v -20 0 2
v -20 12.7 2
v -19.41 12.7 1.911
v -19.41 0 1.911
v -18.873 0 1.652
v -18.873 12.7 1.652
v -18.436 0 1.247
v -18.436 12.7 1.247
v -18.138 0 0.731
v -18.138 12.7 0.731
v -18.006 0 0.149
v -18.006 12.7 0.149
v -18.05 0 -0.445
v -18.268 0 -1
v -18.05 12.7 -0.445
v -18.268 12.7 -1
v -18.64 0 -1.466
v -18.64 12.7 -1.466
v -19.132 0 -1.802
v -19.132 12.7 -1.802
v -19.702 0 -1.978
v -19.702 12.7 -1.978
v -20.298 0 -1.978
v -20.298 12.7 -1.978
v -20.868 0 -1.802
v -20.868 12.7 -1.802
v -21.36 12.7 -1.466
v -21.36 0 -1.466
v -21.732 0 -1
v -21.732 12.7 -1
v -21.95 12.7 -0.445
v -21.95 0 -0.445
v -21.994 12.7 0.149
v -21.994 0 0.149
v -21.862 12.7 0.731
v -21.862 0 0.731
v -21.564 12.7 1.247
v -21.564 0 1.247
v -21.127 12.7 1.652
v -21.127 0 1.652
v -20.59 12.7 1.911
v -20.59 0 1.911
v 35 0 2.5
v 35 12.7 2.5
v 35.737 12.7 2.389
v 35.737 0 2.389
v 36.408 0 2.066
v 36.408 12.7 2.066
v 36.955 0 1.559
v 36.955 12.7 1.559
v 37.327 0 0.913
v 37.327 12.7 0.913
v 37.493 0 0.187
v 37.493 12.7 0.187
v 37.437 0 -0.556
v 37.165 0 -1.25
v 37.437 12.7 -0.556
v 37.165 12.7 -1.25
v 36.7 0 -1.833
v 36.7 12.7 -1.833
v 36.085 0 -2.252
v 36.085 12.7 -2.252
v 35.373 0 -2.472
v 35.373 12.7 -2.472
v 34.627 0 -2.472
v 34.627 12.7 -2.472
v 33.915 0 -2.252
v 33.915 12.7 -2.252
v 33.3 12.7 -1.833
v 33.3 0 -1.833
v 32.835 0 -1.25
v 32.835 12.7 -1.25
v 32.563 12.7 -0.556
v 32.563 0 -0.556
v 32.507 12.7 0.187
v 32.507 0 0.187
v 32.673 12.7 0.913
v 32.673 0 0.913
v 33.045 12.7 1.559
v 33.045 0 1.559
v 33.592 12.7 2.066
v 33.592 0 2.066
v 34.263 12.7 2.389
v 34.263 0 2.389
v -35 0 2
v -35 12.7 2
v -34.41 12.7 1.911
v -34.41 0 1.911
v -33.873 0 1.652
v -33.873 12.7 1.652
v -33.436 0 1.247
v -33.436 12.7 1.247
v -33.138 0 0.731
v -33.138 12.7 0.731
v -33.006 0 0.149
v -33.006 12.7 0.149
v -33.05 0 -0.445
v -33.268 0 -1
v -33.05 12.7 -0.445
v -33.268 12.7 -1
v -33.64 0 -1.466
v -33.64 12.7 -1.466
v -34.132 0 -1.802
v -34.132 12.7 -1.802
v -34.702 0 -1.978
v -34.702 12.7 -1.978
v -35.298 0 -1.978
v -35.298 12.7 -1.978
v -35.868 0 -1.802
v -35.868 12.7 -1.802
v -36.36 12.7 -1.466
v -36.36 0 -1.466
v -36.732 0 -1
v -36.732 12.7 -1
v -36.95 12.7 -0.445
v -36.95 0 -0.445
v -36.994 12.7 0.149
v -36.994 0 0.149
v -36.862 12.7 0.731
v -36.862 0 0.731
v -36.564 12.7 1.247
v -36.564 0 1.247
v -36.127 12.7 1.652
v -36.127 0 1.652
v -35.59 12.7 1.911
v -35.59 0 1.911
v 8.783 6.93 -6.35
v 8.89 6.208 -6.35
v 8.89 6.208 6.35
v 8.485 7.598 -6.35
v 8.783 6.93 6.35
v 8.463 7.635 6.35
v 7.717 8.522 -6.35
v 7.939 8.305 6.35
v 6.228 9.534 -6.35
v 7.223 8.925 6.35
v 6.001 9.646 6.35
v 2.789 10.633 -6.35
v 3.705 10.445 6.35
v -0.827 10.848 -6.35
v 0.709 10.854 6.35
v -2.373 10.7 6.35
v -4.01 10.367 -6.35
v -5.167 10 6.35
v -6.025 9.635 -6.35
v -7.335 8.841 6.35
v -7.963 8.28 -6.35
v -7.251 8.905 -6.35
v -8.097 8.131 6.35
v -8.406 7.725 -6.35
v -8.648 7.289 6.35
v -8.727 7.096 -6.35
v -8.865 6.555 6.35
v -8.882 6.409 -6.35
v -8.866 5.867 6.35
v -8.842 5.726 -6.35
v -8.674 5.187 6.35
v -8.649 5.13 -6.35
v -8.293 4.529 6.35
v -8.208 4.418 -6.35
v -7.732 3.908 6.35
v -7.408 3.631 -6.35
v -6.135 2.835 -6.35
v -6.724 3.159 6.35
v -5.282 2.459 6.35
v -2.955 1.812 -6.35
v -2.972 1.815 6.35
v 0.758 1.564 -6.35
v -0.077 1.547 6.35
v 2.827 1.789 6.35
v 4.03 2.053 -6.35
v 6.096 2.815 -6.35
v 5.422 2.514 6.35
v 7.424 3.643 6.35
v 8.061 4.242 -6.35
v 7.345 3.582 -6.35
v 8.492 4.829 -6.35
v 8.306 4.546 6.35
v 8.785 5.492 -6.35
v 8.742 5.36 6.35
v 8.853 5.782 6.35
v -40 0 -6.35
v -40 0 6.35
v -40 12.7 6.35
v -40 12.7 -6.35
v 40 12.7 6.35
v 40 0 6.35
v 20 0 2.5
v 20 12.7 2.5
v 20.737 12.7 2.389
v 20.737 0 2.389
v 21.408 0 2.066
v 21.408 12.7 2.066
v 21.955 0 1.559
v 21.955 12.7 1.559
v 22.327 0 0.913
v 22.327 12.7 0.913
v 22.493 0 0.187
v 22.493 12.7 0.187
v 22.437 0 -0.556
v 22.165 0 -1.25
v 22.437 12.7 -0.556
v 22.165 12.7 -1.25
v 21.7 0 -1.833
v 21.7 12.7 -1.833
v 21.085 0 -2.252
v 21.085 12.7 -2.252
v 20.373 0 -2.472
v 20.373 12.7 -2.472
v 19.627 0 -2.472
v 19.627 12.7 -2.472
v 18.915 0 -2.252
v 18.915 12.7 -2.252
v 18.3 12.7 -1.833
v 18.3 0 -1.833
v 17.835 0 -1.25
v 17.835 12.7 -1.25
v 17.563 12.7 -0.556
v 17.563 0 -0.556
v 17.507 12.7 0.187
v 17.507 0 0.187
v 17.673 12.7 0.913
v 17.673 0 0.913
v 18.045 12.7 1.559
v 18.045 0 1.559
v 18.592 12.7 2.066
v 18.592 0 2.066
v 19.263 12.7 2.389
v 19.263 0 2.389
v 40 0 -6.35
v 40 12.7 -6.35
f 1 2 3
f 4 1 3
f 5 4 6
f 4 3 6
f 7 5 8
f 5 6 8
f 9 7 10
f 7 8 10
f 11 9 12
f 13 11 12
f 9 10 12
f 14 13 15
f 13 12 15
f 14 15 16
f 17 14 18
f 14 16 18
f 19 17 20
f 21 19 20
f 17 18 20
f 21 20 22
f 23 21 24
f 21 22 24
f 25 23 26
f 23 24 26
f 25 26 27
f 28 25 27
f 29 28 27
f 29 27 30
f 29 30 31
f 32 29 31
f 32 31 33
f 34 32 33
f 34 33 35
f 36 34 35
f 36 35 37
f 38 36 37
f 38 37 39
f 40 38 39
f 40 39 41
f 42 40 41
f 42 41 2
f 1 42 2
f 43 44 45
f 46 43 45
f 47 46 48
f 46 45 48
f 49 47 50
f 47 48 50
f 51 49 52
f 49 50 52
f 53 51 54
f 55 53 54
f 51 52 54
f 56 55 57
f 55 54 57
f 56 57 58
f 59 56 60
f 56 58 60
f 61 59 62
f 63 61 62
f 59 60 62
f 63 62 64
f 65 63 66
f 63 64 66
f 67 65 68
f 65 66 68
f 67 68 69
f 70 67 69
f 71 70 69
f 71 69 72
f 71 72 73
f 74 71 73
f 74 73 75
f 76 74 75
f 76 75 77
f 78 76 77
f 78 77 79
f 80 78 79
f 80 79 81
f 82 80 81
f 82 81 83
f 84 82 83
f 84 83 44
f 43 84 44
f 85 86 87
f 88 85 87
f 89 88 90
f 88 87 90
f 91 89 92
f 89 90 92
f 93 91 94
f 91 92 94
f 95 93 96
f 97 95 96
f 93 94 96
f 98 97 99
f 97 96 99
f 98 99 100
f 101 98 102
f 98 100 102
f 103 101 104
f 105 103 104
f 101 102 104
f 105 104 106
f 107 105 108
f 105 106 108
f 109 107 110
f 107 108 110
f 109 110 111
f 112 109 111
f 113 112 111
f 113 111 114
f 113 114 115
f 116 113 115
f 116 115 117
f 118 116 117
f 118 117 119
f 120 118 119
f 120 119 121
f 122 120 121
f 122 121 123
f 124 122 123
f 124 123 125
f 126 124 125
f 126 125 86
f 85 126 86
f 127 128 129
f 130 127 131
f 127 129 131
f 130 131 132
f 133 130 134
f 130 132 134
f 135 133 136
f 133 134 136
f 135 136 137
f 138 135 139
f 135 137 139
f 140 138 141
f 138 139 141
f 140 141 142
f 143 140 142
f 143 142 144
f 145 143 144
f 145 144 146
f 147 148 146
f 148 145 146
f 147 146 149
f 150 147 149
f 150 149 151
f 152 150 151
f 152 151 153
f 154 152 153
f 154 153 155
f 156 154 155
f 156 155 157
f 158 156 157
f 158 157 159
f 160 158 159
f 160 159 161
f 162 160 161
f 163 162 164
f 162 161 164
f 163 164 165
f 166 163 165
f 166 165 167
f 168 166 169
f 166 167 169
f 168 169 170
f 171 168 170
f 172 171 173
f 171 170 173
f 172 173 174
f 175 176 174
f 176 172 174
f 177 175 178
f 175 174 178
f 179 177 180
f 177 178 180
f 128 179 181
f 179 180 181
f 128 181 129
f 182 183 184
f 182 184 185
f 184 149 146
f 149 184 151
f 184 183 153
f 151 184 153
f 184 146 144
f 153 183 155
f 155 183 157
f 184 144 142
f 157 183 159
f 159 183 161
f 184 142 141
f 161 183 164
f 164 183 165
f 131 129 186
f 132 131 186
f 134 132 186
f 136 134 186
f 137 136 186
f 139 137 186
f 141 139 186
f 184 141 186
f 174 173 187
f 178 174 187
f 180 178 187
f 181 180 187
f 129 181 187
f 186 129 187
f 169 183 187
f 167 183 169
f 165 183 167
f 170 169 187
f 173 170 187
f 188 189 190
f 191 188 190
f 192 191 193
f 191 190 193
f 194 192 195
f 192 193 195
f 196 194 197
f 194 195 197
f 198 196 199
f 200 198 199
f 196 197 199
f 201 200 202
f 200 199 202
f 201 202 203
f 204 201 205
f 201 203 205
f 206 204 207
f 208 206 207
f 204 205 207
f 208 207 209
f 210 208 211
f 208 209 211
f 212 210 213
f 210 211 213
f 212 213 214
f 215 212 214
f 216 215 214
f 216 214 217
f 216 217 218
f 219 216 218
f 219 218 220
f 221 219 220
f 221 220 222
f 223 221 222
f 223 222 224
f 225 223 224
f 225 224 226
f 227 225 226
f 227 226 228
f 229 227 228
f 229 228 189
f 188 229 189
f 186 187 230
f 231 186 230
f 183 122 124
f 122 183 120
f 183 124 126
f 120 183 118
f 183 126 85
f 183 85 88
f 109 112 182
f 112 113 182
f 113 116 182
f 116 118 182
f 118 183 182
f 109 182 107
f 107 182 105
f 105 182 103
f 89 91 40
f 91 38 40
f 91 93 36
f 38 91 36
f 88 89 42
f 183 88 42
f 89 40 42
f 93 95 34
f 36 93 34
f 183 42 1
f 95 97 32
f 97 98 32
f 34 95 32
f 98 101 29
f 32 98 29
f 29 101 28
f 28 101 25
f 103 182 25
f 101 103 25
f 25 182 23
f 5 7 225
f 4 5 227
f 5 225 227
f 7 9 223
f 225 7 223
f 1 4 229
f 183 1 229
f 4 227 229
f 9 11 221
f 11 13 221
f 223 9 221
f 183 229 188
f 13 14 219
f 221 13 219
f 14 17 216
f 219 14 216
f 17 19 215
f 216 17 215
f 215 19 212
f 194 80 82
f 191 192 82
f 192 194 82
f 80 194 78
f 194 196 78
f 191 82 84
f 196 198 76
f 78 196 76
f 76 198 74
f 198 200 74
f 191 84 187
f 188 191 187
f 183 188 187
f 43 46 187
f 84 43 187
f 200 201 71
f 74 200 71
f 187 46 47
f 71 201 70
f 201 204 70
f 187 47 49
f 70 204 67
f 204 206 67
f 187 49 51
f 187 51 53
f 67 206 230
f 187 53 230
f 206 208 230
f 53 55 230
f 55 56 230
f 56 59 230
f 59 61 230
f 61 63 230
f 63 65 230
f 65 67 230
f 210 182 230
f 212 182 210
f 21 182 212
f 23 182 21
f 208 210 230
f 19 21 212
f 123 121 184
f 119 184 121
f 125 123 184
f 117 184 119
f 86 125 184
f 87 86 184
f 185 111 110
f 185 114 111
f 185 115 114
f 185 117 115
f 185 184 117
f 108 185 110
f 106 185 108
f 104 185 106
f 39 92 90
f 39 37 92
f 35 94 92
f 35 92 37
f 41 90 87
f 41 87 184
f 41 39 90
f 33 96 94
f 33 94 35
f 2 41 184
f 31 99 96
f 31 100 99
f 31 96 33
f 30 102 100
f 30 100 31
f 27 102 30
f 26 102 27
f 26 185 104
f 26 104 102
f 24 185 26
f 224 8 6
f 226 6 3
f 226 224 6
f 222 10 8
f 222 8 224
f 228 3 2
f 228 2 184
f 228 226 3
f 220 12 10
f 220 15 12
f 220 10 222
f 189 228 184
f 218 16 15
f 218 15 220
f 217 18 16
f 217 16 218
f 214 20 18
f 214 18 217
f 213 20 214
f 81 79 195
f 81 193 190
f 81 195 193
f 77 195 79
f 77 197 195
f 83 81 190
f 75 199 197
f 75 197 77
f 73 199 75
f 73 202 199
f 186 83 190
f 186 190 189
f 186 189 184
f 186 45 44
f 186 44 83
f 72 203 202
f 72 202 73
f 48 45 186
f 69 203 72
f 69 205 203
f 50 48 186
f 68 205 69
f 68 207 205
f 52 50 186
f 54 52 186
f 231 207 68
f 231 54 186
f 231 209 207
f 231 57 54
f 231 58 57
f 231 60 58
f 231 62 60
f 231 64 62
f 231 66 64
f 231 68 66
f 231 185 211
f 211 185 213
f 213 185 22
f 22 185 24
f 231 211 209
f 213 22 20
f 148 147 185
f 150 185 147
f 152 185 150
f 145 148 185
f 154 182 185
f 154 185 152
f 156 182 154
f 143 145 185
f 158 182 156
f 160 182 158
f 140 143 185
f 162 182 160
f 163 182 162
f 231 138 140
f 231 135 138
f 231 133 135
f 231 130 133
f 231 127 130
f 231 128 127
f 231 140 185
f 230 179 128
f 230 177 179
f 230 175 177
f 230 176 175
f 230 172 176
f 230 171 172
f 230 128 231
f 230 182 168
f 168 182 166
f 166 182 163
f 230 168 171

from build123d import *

# Parameters (mm, degrees)
SKETCH2_W           = 80
SKETCH2_H           = 12.7
BOSS_EXTRUDE1_DEPTH = 12.7
SKETCH3_R           = 2
SKETCH3_R_2         = 2.5
CUT_EXTRUDE1_DEPTH  = 43.445406112
SKETCH4_RX          = 8.89
SKETCH4_RY          = 4.6609
CUT_EXTRUDE3_DEPTH  = 44.847234804


with BuildPart() as part:
    # Sketch2 → Boss-Extrude1 (new body)
    with BuildSketch(Plane(origin=(0, 0, 0), x_dir=(1, 0, 0), z_dir=(0, 1, 0))):
        Rectangle(SKETCH2_W, SKETCH2_H)
    extrude(amount=BOSS_EXTRUDE1_DEPTH)

    # Sketch3 → Cut-Extrude1 (cut, through all)
    with BuildSketch(Plane(origin=(0, 12.7, 0), x_dir=(1, 0, 0), z_dir=(0, 1, 0))):
        with Locations(Location((-35, 0, 0), (0, 0, 270))):
            Circle(SKETCH3_R)
        with Locations(Location((-20, 0, 0), (0, 0, 270))):
            Circle(SKETCH3_R)
        with Locations(Location((35, 0, 0), (0, 0, 270))):
            Circle(SKETCH3_R_2)
        with Locations(Location((20, 0, 0), (0, 0, 270))):
            Circle(SKETCH3_R_2)
    extrude(amount=-CUT_EXTRUDE1_DEPTH, mode=Mode.SUBTRACT)

    # Sketch4 → Cut-Extrude3 (cut, through all)
    with BuildSketch(Plane.XY.offset(6.35)):
        with Locations((0, 6.20775407)):
            Ellipse(SKETCH4_RX, SKETCH4_RY)
    extrude(amount=-CUT_EXTRUDE3_DEPTH, mode=Mode.SUBTRACT)


solid = part.part
